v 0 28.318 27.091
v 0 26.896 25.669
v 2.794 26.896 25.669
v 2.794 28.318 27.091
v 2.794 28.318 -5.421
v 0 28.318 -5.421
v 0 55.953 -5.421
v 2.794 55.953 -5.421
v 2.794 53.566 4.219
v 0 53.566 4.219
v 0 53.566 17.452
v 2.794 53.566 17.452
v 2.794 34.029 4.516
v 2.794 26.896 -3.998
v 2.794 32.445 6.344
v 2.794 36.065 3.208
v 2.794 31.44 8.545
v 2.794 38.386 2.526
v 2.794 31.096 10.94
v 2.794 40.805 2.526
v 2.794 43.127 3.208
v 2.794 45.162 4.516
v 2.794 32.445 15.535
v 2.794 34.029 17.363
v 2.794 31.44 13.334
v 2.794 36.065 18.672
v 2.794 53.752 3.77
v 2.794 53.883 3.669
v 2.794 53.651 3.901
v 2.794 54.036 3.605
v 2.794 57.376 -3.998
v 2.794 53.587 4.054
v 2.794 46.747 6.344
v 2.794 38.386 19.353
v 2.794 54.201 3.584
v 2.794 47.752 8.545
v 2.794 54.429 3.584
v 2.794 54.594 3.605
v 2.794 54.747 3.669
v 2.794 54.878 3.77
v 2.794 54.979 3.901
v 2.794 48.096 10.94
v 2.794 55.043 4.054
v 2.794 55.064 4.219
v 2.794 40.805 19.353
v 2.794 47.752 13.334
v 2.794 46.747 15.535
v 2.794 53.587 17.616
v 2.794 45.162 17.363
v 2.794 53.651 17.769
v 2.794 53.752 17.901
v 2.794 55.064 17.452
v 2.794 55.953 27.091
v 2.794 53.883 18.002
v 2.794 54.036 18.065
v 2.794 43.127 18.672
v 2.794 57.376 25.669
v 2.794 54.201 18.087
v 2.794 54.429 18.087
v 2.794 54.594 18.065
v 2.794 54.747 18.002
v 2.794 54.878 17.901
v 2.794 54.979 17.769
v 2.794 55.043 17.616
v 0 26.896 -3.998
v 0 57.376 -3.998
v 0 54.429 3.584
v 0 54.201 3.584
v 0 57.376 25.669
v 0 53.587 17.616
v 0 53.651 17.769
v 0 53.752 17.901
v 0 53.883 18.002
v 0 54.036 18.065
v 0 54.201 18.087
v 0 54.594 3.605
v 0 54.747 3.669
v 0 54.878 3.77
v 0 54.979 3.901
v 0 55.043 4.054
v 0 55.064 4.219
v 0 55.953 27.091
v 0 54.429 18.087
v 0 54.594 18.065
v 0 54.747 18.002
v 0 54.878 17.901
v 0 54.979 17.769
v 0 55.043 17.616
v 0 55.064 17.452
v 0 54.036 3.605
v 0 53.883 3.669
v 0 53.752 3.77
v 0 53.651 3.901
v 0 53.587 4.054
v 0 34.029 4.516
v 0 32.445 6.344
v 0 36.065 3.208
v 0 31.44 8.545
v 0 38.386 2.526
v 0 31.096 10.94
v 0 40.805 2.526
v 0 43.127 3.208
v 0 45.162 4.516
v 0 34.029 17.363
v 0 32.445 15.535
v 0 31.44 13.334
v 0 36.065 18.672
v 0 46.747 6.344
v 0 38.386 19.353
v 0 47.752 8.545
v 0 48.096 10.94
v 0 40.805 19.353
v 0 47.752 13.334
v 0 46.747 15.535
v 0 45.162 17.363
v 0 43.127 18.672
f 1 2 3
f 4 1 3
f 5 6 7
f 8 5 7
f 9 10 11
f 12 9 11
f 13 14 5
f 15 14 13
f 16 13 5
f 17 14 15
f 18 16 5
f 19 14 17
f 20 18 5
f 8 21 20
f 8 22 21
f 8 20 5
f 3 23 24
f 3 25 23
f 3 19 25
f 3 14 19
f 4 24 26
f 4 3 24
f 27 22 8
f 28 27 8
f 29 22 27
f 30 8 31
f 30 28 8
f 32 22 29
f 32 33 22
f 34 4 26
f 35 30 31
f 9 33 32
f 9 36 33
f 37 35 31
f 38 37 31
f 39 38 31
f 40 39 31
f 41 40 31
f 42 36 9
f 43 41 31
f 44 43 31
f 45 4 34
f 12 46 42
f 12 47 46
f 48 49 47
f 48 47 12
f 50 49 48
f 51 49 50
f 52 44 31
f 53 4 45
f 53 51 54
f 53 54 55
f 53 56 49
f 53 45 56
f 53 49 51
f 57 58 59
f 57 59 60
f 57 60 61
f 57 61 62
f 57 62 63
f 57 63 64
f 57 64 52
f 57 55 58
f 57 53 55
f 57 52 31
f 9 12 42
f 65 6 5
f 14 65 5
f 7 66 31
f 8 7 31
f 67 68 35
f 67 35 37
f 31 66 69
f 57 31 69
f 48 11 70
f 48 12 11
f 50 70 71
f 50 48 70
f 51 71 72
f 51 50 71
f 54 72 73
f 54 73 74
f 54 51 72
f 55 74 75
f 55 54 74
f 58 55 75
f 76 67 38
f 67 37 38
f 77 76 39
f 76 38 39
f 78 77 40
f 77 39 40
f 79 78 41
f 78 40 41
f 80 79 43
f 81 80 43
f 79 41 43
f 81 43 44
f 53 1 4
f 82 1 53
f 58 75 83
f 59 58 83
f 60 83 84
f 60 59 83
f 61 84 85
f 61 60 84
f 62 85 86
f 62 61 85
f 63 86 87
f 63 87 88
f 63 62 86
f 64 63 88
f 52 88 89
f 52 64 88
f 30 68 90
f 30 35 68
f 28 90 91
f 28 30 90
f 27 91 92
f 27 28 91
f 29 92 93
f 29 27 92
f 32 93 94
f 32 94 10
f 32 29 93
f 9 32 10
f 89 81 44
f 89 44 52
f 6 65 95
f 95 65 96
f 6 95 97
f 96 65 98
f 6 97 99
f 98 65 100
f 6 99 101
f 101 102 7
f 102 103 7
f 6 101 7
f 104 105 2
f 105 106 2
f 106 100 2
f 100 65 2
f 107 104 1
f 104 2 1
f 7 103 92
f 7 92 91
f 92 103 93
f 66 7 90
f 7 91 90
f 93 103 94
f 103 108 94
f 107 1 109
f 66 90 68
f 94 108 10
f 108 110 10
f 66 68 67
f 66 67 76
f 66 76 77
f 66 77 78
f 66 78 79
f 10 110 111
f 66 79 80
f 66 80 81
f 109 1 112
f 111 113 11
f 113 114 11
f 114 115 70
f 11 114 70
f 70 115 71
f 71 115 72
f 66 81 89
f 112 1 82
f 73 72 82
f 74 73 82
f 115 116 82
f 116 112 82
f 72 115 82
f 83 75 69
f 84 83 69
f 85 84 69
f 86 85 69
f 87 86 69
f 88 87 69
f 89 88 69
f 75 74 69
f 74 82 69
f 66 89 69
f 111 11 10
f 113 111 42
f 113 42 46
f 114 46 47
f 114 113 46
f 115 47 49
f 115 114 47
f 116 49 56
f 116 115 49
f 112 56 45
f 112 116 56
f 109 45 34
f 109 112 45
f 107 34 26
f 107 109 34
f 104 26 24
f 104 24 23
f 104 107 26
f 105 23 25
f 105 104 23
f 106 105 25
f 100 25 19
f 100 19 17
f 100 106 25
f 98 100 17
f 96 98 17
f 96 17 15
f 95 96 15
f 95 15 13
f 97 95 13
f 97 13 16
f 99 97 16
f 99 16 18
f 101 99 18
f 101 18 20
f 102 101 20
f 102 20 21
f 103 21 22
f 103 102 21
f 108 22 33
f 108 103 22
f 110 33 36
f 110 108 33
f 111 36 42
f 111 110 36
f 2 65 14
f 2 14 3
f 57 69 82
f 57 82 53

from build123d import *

# Parameters (mm, degrees)
F0_W     = 30.48
F0_H     = 32.512
F0_R     = 8.50011
F0_W_2   = 1.4986
F0_H_2   = 14.5034
F1_DEPTH = 2.794
F2_SIZE  = 1.4224
F3_SIZE  = 1.4224
F4_SIZE  = 1.4224
F5_SIZE  = 1.4224
F6_R     = 0.635
F7_R     = 0.635
F8_R     = 0.635
F9_R     = 0.635


with BuildPart() as f1:
    # F0 (on Right) → F1 (new body)
    with BuildSketch(Plane.YZ):
        with Locations((42.135775, 10.835214)):
            Rectangle(F0_W, F0_H)
        with Locations((39.595775, 10.939535)):
            Circle(F0_R, mode=Mode.SUBTRACT)
        with Locations((54.315075, 10.835214)):
            Rectangle(F0_W_2, F0_H_2, mode=Mode.SUBTRACT)
    extrude(amount=F1_DEPTH)

    # F2
    f2_edges = [f1.edges().sort_by_distance(p)[0] for p in [
        (1.397, 57.375775, 27.091214),
    ]]
    chamfer(f2_edges, length=F2_SIZE)

    # F3
    f3_edges = [f1.edges().sort_by_distance(p)[0] for p in [
        (1.397, 26.895775, 27.091214),
    ]]
    chamfer(f3_edges, length=F3_SIZE)

    # F4
    f4_edges = [f1.edges().sort_by_distance(p)[0] for p in [
        (1.397, 26.895775, -5.420786),
    ]]
    chamfer(f4_edges, length=F4_SIZE)

    # F5
    f5_edges = [f1.edges().sort_by_distance(p)[0] for p in [
        (1.397, 57.375775, -5.420786),
    ]]
    chamfer(f5_edges, length=F5_SIZE)

    # F6
    f6_edges = [f1.edges().sort_by_distance(p)[0] for p in [
        (1.397, 53.565775, 3.583514),
    ]]
    fillet(f6_edges, radius=F6_R)

    # F7
    f7_edges = [f1.edges().sort_by_distance(p)[0] for p in [
        (1.397, 55.064375, 3.583514),
    ]]
    fillet(f7_edges, radius=F7_R)

    # F8
    f8_edges = [f1.edges().sort_by_distance(p)[0] for p in [
        (1.397, 53.565775, 18.086914),
    ]]
    fillet(f8_edges, radius=F8_R)

    # F9
    f9_edges = [f1.edges().sort_by_distance(p)[0] for p in [
        (1.397, 55.064375, 18.086914),
    ]]
    fillet(f9_edges, radius=F9_R)


solid = f1.part
